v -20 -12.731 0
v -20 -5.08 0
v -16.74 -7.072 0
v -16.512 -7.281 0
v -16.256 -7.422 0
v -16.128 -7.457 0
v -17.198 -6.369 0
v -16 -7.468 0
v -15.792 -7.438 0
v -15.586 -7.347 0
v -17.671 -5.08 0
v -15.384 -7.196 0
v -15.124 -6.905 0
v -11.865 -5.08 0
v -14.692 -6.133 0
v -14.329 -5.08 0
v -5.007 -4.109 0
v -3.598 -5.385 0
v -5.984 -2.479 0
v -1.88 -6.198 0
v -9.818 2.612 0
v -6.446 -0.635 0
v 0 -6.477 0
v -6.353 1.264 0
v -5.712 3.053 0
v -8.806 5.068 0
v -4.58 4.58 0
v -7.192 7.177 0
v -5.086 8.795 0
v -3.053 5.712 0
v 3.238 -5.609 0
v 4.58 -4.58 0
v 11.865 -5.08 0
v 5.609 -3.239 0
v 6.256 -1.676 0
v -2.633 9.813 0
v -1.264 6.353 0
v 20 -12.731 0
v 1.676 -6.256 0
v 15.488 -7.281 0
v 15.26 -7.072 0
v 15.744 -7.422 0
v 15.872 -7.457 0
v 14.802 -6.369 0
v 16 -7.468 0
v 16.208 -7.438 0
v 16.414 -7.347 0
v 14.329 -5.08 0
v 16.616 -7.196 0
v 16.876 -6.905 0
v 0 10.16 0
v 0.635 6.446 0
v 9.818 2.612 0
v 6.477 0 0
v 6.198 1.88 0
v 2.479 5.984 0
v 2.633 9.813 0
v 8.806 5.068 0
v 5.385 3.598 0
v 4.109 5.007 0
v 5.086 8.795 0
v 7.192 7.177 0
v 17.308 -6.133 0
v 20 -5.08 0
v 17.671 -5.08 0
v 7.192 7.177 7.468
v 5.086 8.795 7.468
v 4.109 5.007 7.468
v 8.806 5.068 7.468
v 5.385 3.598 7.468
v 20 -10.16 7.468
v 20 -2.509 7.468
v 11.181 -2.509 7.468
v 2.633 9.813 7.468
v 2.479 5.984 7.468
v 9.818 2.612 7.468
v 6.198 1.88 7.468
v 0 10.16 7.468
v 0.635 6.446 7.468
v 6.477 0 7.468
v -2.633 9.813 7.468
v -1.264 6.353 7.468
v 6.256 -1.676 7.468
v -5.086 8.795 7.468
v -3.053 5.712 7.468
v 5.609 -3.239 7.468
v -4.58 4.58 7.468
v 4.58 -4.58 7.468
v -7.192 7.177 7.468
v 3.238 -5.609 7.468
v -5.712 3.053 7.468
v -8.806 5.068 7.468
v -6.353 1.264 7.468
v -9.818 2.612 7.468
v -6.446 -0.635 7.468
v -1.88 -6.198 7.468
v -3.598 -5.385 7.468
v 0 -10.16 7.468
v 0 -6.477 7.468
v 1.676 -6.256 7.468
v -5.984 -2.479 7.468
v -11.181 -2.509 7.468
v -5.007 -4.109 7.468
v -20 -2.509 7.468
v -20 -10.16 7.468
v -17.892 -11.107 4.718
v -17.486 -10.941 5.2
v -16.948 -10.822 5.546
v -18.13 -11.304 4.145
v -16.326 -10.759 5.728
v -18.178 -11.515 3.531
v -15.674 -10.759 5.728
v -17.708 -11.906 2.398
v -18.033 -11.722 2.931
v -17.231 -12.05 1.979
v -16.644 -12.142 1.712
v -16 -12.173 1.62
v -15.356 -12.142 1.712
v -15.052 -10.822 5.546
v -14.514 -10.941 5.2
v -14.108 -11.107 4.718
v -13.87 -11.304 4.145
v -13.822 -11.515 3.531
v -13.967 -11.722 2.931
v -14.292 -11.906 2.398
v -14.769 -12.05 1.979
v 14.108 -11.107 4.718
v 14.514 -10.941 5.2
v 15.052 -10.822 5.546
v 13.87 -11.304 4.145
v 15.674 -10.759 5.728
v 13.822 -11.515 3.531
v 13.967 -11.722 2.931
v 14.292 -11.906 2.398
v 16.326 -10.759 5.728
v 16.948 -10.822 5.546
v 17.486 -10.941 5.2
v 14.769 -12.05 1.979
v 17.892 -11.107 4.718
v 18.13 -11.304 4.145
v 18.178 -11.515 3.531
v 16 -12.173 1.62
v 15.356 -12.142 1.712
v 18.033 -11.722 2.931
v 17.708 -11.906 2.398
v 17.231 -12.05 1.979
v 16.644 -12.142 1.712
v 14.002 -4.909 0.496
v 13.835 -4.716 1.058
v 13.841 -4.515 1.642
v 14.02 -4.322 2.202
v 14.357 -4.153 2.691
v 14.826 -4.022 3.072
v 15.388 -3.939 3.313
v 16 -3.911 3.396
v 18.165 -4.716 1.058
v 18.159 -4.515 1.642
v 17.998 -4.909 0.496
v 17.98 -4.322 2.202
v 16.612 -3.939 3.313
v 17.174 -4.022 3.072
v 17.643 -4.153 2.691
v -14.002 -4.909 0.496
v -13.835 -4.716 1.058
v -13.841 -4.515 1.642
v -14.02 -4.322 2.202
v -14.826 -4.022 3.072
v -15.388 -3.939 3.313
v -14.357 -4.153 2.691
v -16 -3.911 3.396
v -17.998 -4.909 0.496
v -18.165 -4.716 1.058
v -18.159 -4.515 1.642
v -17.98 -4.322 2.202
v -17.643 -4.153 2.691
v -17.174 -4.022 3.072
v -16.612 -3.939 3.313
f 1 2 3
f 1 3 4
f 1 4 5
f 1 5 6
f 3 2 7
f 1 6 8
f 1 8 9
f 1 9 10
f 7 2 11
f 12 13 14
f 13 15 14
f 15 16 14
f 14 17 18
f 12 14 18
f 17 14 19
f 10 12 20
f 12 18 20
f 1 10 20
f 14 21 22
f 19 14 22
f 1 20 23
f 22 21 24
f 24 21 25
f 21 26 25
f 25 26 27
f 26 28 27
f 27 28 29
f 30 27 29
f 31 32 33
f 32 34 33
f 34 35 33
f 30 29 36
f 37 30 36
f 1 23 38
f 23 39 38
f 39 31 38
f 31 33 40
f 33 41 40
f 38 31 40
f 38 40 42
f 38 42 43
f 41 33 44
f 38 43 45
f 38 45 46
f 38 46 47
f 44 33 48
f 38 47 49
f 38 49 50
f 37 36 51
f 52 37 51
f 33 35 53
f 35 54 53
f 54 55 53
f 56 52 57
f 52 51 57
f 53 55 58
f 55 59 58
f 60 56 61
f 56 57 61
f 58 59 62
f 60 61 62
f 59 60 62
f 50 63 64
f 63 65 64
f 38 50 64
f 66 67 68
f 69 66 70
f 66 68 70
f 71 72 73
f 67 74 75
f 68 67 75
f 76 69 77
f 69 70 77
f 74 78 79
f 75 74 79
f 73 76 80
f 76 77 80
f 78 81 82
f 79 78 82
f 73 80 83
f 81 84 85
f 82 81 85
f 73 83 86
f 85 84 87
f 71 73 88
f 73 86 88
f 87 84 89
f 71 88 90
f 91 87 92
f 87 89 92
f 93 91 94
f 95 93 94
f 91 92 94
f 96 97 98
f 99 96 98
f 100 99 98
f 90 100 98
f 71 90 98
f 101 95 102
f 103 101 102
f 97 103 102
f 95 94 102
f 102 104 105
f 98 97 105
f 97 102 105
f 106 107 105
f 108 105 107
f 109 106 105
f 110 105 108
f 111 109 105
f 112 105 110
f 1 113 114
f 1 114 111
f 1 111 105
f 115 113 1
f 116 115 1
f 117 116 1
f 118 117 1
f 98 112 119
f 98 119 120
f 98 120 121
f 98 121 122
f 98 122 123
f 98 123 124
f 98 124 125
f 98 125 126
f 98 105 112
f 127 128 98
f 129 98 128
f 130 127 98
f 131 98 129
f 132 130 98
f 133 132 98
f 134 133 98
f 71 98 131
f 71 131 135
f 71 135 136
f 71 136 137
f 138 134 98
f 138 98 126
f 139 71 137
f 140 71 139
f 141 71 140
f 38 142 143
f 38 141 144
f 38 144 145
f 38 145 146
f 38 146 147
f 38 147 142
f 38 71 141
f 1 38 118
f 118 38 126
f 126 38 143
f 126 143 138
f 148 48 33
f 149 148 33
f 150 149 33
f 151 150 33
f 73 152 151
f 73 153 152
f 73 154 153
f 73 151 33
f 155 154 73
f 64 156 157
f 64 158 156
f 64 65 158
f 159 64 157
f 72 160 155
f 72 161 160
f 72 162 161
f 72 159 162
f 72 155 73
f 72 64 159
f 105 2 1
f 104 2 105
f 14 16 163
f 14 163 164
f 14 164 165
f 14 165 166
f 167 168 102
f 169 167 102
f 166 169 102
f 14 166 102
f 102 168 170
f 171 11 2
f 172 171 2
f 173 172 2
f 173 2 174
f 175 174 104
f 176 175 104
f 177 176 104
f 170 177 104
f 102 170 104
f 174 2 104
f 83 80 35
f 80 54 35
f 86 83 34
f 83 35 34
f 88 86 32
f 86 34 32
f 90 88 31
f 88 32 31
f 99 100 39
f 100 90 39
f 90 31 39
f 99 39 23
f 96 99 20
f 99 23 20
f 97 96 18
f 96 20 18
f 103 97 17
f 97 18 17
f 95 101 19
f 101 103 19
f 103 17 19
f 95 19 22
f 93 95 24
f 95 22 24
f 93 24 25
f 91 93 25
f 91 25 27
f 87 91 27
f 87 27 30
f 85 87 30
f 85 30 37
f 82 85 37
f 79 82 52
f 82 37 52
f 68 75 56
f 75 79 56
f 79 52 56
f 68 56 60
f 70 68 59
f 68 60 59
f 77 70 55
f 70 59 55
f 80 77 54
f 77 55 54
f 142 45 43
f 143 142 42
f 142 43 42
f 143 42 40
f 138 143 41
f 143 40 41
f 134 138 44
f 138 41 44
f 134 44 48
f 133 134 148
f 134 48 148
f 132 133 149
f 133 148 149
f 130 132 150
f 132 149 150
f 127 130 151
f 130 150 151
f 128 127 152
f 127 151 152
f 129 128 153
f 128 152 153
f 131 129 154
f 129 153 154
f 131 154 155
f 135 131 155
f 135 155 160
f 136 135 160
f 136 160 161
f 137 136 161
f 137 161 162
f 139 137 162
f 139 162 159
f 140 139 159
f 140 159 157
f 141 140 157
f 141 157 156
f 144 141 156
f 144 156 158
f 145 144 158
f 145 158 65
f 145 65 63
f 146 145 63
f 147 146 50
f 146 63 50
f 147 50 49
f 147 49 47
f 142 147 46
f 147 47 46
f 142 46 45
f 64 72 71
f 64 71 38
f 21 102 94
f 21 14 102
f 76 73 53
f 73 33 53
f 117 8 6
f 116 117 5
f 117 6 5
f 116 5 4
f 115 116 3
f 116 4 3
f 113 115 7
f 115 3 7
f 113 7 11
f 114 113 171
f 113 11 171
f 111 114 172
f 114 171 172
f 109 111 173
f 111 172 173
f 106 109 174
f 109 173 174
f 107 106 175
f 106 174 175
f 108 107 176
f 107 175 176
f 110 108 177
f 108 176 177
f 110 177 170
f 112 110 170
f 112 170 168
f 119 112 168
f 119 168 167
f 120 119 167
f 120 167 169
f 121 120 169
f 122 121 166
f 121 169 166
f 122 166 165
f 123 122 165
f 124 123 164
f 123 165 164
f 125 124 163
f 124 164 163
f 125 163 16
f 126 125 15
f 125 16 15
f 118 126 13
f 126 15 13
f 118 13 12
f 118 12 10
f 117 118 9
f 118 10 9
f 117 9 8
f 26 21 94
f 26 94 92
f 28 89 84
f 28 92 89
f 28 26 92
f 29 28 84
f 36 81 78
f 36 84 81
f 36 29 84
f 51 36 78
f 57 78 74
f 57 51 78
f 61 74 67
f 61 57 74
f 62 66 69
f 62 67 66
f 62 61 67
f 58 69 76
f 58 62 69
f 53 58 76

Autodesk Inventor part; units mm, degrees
ref_plane "YZ Plane" through (0, 0, 0) normal (1, 0, 0) x (0, 1, 0)
ref_plane "XZ Plane" through (0, 0, 0) normal (0, 1, 0) x (-1, 0, 0)
sketch "Sketch1" plane through (0, 0, 0) normal (0, 0, 1) x (1, 0, 0)
  circle A0 centre (0, 0) radius 6.477
  arc A1 (9.8184, 2.6122) -> (-9.8184, 2.6122) centre (0, 0) ccw
  line L0 (0, -10.16) -> (-20, -10.16)
  line L1 (-20, -10.16) -> (-20, -5.08)
  line L2 (0, -5.08) -> (0, -10.16)
  line L3 (0, -10.16) -> (20, -10.16)
  line L4 (20, -10.16) -> (20, -5.08)
  line L5 (0, -5.08) -> (0, -10.16)
  line L6 (-16, -5.08) -> (-16, -10.16) construction
  line L7 (-19.5, -5.08) -> (-19.5, -10.16) construction
  line L8 (-12.5, -5.08) -> (-12.5, -10.16) construction
  line L9 (-11.865, -5.08) -> (-11.865, -10.16) construction
  line L10 (-11.865, -5.08) -> (-9.8184, 2.6122)
  line L11 (16, -5.08) -> (16, -10.16) construction
  line L12 (12.5, -5.08) -> (12.5, -10.16) construction
  line L13 (11.865, -5.08) -> (11.865, -10.16) construction
  line L14 (11.865, -5.08) -> (9.8184, 2.6122)
  line L15 (20, -5.08) -> (11.865, -5.08)
  line L16 (-20, -5.08) -> (-11.865, -5.08)
  dimension "d0" = 12.954
  dimension "d1" = 20.32
  dimension "d3" = 5.08
  dimension "d5" = 5.08
  dimension "d6" = 16
  dimension "d7" = 3.5
  dimension "d8" = 3.5
  dimension "d9" = 0.635
  dimension "d10" = 16
  dimension "d11" = 3.5
  dimension "d12" = 0.635
ref_plane "Work Plane1" through (-6.9215, -6.9215, 7.4676) normal (0, 0, -1) x (0, 1, 0)
extrude "Extrusion1" add sketch "Sketch1" along normal up to surface (7.4676 mm away)
sketch "Sketch3" plane through (20, -10.16, 0) normal (1, 0, 0) x (0, 0, -1)
  line L0 (-7.4676, 5.08) -> (-7.4676, 0) projected
  line L1 (-7.4676, 0) -> (0, -2.5713)
  line L2 (-7.4676, 0) -> (0.6469, 0) construction
  line L3 (0, 0) -> (0, -2.5713)
  line L4 (0, 0) -> (-7.4676, 0) projected
  line L5 (0, 0) -> (-7.4676, 0)
  point P0 (0, 10.16)
  dimension "d28" = 19
extrude "Extrusion2" add sketch "Sketch3" against normal up to surface (40 mm away)
sketch "Sketch4" plane through (20, -5.08, 7.4676) normal (1, 0, 0) x (0, 0, -1)
  line L0 (7.4676, 0) -> (0, 0) projected
  line L1 (7.4676, 0) -> (0, 0)
  line L2 (7.4676, 0) -> (0, 2.5713)
  line L3 (0, 0) -> (0, 7.6922) projected
  line L4 (7.4676, 0) -> (15.3655, 0) construction
  line L5 (0, 7.6922) -> (0, 0) projected
  line L6 (0, 2.5713) -> (0, 0)
  point P0 (7.4676, 5.08)
  dimension "d31" = 161
extrude "Extrusion3" add sketch "Sketch4" against normal blind 10.16
sketch "Sketch5" plane through (-20, -5.08, 0) normal (-1, 0, 0) x (0, 0, 1)
  line L0 (7.4676, 7.6922) -> (7.4676, 0) projected
  line L1 (0, 0) -> (7.4676, 0)
  line L2 (0, 0) -> (7.4676, 2.5713)
  line L3 (0, 0) -> (7.8979, 0) construction
  line L4 (7.4676, 0) -> (7.4676, -5.08) projected
  line L5 (7.4676, 2.5713) -> (7.4676, 0)
  point P0 (0, 5.08)
  dimension "d34" = 19
extrude "Extrusion4" add sketch "Sketch5" against normal blind 10.16
sketch "Sketch6" plane through (-20, -12.7313, 0) normal (0, -0.9455, 0.3256) x (1, 0, 0)
  line L0 (40, 2.491) -> (40, 10.3889) construction
  line L1 (40, 3.8979) -> (0, 3.8979) construction
  line L2 (0, 7.8979) -> (40, 7.8979) construction
  line L3 (36, 7.8979) -> (36, 0) construction
  line L4 (40, 0) -> (0, 0) construction
  line L5 (40, 7.8979) -> (40, 0) construction
  line L6 (4, 7.8979) -> (4, 0) construction
  line L7 (0, 7.8979) -> (0, 0) construction
  circle A0 centre (36, 3.8979) radius 2.1844
  circle A1 centre (4, 3.8979) radius 2.1844
  point P0 (20, 4.1449)
  dimension "d37" = 4
  dimension "d38" = 4
  dimension "d39" = 4
  dimension "d40" = 4.3688
  dimension "d41" = 4.3688
hole "Hole2" at (16, -11.4623, 3.6855) at (-16, -11.4623, 3.6855) direction (0, 0.9455, -0.3256) diameter 4.3688 end through all
properties part number "omni wheel shaft holder low channel side attach"
